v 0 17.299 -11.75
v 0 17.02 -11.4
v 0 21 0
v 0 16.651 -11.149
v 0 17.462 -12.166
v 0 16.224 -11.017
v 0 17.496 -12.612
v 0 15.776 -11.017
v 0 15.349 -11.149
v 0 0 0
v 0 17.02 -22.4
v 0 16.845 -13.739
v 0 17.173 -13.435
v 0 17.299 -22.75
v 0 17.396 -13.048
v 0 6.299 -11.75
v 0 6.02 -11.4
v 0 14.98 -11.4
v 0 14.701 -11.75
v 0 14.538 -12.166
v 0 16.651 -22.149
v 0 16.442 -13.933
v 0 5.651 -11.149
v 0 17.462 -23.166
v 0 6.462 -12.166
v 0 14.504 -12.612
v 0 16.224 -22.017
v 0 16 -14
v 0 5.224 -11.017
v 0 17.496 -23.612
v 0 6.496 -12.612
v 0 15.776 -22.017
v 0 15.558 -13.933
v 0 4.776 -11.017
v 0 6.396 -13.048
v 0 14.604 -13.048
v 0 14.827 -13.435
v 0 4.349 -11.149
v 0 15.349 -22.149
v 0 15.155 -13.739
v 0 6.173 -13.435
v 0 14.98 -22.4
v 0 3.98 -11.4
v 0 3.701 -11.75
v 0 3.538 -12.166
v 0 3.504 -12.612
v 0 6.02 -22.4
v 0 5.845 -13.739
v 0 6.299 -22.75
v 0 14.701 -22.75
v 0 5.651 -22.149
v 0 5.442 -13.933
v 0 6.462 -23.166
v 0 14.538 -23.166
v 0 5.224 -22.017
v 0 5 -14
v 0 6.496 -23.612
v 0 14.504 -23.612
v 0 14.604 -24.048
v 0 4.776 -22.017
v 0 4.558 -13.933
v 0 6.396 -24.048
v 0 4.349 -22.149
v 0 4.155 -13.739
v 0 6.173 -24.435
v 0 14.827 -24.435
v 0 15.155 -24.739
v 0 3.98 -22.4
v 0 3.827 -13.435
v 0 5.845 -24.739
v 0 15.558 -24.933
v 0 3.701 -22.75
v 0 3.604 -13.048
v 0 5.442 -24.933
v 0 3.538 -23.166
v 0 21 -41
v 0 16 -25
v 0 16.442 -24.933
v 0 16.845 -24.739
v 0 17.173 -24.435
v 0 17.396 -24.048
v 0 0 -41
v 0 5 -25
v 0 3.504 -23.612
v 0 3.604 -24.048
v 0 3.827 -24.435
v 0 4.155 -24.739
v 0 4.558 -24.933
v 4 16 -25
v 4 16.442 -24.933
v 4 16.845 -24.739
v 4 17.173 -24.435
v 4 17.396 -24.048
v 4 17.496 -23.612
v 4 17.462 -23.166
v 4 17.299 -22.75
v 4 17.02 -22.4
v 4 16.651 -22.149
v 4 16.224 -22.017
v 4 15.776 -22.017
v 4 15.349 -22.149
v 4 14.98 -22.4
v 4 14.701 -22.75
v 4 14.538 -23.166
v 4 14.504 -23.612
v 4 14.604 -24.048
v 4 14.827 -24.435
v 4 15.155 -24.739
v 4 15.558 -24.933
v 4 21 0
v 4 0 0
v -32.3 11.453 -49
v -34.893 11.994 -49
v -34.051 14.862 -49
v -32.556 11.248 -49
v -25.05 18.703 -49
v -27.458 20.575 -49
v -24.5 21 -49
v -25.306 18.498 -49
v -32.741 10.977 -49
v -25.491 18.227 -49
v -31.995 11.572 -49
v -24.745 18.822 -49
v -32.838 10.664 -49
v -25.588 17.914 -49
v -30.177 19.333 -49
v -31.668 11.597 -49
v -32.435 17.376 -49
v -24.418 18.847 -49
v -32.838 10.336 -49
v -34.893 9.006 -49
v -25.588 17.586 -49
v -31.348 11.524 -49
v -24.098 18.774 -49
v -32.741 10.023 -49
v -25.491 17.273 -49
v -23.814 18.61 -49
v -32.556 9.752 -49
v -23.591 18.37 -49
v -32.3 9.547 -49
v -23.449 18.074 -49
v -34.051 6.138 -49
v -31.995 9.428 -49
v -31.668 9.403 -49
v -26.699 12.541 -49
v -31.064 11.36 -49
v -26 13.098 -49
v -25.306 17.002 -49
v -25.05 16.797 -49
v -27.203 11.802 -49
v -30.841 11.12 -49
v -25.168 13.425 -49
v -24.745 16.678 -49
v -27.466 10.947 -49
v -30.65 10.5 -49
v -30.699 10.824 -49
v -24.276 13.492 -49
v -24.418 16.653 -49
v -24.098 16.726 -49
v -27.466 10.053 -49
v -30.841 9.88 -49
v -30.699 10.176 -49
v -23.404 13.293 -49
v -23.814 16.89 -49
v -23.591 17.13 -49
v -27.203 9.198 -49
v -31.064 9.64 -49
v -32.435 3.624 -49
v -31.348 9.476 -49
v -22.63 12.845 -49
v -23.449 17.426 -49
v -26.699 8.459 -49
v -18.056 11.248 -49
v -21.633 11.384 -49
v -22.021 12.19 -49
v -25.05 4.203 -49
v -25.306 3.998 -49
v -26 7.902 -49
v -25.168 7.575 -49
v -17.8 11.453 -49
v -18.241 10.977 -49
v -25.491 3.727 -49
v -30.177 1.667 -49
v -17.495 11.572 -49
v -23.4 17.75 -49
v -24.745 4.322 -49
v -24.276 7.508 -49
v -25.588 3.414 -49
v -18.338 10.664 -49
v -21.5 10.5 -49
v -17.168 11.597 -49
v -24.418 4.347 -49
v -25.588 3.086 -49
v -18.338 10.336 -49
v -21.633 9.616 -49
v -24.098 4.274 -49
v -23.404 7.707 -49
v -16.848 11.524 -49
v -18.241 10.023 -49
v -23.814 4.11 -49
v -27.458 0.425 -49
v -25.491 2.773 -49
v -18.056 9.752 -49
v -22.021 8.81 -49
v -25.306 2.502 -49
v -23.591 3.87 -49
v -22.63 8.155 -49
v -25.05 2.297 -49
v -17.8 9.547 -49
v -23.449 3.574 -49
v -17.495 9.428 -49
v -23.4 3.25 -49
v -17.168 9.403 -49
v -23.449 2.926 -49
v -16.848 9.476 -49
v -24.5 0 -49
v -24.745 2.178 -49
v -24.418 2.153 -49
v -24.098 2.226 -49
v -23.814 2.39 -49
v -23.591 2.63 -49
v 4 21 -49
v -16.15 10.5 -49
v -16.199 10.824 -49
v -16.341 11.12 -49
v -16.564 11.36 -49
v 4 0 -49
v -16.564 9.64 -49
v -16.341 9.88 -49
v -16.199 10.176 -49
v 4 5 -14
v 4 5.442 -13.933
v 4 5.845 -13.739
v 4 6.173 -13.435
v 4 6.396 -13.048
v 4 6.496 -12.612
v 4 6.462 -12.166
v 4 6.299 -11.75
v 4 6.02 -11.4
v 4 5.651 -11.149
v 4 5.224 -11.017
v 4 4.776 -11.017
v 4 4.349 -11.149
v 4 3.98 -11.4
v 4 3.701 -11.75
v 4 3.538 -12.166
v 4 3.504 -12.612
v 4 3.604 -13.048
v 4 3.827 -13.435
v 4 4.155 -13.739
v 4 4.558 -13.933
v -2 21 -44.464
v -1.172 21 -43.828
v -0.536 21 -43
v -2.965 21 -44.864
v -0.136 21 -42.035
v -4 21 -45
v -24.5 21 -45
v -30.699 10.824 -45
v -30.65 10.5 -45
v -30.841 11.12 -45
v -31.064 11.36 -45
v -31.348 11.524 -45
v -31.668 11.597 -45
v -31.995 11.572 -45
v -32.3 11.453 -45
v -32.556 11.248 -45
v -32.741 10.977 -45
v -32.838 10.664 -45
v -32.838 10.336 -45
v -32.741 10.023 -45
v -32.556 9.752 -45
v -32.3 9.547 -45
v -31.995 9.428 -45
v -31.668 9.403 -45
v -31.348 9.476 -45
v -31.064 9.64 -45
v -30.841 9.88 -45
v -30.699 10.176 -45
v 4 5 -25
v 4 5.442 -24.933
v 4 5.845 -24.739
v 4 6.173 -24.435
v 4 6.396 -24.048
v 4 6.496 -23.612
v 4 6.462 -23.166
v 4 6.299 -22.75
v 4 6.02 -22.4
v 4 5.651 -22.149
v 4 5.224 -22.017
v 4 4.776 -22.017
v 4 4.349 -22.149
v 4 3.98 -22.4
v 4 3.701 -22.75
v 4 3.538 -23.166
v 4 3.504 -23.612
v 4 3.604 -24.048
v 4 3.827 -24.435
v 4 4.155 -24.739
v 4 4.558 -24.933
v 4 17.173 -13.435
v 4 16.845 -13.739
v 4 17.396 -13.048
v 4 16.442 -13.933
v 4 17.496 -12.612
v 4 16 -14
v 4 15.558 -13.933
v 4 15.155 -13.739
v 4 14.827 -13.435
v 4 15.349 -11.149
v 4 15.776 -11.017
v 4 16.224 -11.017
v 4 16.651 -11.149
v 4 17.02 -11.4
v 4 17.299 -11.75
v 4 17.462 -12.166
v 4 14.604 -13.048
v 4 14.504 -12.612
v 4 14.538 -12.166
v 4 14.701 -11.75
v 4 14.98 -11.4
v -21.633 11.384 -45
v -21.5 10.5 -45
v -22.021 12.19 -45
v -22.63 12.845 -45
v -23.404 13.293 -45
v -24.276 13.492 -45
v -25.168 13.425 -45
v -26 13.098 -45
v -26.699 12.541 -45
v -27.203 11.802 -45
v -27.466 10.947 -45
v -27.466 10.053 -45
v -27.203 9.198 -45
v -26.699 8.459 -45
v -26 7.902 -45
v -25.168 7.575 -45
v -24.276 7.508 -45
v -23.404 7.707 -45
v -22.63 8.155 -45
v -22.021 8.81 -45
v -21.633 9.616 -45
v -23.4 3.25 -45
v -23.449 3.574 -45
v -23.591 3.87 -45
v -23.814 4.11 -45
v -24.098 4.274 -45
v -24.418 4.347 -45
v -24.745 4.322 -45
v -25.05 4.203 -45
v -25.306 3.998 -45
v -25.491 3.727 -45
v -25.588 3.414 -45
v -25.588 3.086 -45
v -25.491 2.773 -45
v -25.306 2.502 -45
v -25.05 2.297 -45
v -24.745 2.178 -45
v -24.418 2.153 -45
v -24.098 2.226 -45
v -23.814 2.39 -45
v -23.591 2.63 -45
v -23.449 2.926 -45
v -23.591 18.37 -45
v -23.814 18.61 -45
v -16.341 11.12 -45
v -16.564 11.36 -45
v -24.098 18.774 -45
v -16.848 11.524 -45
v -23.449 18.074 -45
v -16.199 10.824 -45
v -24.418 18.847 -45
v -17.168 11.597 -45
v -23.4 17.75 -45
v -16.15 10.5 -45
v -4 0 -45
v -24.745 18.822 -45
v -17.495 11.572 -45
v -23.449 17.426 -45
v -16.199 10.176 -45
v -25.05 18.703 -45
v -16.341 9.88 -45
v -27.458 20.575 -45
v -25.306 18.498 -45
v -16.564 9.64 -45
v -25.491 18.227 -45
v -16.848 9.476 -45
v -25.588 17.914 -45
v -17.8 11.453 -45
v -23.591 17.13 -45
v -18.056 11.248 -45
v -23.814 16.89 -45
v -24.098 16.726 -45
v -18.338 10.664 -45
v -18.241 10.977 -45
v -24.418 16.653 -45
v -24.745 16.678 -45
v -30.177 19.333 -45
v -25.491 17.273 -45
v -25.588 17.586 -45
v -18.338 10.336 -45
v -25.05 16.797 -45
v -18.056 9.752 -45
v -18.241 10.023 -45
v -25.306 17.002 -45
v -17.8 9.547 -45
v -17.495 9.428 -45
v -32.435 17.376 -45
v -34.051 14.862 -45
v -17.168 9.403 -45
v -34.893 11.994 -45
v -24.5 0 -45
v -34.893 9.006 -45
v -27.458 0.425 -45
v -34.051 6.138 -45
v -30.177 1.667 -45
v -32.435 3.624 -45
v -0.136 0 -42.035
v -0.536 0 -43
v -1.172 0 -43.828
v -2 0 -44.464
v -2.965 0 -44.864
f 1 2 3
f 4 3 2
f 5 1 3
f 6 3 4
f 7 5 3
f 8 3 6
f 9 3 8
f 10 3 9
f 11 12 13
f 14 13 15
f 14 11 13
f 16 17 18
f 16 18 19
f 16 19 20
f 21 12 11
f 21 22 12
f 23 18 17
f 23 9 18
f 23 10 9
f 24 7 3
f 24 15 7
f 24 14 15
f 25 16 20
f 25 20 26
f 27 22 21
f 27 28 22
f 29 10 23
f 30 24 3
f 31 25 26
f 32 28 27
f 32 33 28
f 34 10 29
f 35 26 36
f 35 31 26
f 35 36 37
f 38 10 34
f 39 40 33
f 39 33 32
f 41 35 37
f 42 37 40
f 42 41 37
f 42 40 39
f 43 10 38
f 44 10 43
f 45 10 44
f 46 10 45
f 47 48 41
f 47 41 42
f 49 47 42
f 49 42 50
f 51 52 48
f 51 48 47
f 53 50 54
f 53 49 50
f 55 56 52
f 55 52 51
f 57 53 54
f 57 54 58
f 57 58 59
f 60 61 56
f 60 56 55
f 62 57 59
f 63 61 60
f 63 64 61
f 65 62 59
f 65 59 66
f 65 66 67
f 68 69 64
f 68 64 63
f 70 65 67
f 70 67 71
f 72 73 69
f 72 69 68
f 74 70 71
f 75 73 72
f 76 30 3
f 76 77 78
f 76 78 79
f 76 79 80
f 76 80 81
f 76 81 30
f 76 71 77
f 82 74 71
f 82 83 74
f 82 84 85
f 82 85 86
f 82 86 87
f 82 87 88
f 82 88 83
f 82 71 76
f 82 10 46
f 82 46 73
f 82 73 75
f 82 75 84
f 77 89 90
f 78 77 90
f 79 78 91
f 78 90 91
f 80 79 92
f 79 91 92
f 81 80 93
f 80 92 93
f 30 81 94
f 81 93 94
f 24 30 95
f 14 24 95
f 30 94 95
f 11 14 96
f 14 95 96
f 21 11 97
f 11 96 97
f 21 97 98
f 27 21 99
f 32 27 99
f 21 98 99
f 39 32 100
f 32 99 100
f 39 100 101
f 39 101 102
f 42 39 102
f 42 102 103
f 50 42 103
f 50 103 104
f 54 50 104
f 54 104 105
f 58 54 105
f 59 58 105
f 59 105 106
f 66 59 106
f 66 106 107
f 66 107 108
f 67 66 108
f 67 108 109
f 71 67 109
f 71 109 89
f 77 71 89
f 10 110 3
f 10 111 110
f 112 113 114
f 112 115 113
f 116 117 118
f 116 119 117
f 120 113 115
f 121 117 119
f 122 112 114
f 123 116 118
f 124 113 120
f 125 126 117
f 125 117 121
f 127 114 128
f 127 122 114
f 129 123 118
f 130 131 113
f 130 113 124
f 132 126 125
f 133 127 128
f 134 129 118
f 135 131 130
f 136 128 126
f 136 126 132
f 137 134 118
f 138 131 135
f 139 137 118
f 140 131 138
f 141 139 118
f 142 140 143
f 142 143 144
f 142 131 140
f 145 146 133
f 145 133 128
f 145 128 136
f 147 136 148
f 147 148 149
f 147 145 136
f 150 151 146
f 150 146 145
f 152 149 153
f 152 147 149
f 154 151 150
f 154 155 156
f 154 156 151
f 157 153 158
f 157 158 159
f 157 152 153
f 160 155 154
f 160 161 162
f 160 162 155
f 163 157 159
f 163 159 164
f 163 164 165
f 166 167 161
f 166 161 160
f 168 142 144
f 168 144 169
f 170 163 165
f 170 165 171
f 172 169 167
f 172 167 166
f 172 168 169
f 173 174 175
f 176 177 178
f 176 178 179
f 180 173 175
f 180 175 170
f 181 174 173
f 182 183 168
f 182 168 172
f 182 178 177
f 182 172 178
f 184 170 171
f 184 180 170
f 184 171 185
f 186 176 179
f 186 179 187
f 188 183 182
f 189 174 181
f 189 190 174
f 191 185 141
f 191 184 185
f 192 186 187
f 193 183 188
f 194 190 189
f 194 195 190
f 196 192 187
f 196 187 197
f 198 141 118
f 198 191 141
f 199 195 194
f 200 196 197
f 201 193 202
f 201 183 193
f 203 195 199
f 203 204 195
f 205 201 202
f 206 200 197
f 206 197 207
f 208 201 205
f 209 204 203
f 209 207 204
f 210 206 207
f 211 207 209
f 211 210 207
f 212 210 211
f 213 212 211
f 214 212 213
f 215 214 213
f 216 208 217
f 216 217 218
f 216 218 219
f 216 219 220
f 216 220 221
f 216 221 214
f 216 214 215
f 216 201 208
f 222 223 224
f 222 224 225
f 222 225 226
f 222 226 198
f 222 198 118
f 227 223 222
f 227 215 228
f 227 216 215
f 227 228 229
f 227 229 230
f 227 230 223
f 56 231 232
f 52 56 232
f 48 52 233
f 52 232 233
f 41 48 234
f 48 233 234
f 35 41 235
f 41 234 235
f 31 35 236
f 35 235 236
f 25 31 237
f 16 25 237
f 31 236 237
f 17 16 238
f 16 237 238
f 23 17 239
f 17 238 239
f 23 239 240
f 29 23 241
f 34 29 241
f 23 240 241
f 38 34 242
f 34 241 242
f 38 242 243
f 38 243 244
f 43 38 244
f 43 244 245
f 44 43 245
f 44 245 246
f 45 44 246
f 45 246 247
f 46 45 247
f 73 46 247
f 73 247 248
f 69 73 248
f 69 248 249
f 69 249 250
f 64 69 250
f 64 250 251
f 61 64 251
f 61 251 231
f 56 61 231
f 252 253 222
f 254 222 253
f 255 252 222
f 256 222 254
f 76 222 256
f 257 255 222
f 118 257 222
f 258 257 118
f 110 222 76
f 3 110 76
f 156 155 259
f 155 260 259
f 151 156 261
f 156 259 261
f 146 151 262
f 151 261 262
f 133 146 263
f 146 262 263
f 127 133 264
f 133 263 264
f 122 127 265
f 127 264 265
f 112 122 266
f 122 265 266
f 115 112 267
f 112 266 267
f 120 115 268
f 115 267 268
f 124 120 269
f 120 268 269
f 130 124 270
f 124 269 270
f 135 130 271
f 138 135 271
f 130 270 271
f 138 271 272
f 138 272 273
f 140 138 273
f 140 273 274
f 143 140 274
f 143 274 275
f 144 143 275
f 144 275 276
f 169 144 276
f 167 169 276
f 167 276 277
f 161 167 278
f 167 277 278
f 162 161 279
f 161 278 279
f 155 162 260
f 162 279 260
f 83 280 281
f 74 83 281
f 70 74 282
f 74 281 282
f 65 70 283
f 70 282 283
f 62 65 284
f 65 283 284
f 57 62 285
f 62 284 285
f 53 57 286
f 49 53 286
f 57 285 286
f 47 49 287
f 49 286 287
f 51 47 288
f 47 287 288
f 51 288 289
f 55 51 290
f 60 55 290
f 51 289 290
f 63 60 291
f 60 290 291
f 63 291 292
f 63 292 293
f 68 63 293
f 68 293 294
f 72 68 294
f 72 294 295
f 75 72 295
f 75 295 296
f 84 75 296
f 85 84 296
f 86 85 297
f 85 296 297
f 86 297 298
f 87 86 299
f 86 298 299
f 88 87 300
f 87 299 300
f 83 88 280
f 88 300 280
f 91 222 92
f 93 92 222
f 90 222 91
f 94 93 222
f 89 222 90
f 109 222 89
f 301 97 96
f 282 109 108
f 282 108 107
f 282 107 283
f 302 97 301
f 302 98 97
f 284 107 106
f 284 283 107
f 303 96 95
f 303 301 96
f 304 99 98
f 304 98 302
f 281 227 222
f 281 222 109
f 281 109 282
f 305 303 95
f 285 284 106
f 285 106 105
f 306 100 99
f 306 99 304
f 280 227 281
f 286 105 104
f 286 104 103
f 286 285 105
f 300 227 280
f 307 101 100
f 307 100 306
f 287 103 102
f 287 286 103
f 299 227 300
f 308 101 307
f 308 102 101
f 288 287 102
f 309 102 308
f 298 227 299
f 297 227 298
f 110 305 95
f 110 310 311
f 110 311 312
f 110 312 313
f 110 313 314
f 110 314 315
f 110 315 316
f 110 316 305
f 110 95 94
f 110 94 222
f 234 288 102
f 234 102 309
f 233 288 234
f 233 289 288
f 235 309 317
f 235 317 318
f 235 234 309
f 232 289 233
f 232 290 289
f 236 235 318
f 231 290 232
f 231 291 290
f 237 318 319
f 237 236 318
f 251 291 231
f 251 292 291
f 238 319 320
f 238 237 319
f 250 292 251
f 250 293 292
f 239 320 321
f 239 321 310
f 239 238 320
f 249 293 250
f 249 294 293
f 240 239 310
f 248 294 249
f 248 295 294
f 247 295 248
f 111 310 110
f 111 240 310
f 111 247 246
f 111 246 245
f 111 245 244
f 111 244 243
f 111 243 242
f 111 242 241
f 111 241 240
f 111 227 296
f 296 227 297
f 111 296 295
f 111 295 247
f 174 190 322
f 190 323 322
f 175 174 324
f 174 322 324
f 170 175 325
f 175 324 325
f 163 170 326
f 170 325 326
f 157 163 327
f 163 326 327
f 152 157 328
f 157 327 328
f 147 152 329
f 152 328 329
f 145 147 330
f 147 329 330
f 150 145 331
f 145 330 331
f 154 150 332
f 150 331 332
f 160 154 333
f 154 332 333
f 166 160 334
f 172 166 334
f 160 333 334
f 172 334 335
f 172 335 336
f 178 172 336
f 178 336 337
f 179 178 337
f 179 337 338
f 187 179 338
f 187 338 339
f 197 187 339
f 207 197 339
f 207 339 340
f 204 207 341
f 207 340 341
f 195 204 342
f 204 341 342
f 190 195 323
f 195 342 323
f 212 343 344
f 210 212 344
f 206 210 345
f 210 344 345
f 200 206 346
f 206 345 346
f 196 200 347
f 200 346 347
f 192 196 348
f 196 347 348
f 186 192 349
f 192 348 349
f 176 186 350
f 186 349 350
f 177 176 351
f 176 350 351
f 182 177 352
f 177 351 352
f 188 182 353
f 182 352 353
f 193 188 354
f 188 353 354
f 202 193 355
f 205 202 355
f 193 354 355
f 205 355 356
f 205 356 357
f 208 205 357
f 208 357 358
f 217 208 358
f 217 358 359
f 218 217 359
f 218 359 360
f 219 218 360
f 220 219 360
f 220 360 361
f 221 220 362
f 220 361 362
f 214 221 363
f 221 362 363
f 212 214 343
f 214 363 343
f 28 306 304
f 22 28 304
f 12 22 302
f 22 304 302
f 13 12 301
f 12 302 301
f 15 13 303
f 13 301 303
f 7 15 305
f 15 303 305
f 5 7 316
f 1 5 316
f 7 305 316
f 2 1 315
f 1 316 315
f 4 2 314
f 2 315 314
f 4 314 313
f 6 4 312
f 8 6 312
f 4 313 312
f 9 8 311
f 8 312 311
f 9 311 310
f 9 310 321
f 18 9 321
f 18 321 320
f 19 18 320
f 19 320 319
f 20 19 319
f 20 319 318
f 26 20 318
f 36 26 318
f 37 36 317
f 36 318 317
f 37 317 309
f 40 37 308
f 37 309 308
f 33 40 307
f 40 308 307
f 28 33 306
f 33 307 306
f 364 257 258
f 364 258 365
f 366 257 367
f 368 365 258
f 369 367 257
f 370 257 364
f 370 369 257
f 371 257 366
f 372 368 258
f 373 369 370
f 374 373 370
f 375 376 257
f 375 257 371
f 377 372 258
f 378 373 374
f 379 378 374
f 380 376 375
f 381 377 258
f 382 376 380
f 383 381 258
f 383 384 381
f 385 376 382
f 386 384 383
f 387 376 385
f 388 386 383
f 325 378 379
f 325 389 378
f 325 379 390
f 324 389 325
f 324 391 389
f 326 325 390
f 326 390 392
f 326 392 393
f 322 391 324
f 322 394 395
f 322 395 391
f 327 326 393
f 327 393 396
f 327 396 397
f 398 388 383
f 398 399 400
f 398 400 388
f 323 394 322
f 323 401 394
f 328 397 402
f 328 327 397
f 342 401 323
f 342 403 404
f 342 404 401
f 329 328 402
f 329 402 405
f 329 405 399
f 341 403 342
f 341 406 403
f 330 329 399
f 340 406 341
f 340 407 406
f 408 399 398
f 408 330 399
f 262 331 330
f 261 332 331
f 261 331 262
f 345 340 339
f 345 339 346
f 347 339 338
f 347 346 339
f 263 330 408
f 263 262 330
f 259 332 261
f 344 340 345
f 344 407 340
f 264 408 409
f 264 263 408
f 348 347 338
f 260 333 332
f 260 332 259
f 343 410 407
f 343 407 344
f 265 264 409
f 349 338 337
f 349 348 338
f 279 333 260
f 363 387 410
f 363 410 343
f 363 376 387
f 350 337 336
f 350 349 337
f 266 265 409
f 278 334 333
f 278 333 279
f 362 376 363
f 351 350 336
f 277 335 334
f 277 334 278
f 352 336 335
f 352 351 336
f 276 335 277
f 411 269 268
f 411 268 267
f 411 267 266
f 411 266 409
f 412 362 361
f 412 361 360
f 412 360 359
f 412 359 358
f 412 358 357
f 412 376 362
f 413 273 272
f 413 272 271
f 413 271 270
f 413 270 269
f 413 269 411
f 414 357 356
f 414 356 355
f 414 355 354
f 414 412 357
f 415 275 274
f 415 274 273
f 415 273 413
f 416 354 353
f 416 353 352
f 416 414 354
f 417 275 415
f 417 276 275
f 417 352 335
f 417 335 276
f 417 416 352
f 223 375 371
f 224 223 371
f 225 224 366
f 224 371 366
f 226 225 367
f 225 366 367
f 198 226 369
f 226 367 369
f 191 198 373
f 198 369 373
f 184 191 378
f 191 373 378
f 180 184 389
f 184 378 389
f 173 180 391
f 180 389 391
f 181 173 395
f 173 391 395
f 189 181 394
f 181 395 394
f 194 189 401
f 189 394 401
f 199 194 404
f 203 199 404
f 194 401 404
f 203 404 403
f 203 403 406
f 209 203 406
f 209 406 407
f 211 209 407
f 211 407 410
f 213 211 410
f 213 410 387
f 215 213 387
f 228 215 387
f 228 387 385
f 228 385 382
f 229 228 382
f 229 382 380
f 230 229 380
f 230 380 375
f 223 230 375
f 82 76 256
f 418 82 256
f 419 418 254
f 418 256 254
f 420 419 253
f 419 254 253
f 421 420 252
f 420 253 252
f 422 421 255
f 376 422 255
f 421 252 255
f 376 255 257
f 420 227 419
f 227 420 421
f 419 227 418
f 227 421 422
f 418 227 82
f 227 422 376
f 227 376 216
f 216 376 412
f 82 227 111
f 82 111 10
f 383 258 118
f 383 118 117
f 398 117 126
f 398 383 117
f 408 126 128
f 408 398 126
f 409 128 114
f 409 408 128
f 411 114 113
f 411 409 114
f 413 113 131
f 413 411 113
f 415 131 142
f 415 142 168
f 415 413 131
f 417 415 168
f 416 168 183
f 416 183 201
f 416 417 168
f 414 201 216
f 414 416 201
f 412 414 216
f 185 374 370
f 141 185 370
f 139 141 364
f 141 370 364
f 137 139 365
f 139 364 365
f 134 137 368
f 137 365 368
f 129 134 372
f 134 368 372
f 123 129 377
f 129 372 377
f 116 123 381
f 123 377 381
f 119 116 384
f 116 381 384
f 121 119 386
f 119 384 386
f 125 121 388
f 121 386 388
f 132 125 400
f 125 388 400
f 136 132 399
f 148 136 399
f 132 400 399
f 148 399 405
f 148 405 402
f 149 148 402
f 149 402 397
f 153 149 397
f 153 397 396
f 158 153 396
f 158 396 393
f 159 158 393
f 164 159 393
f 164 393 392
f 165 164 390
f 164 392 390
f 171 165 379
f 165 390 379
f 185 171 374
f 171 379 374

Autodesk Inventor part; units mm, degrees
ref_plane "YZ Plane" through (0, 0, 0) normal (1, 0, 0) x (0, 1, 0)
ref_plane "XZ Plane" through (0, 0, 0) normal (0, 1, 0) x (-1, 0, 0)
ref_plane "XY Plane" through (0, 0, 0) normal (0, 0, 1) x (1, 0, 0)
sketch "Sketch1" plane through (0, 0, 0) normal (0, 1, 0) x (-1, 0, 0)
  line L0 (0, 0) -> (0, -45)
  line L1 (0, -45) -> (35, -45)
  line L2 (35, -45) -> (35, -49)
  line L3 (35, -49) -> (-4, -49)
  line L4 (-4, -49) -> (-4, 0)
  line L5 (-4, 0) -> (0, 0)
  dimension "d0" = 45
  dimension "d1" = 35
  dimension "d2" = 4
  dimension "d3" = 39
extrude "Extrusion1" add sketch "Sketch1" along normal blind 21
sketch "Sketch2" plane through (4, 0, 0) normal (1, 0, 0) x (0, 0, -1)
  line L0 (0, 21) -> (49, 21) projected
  line L1 (0, 21) -> (12.5, 21)
  line L2 (12.5, 21) -> (12.5, 16)
  line L3 (12.5, 16) -> (0, 16)
  line L4 (0, 16) -> (0, 21)
  line L5 (12.5, 16) -> (23.5, 16)
  line L6 (23.5, 16) -> (23.5, 5)
  line L7 (23.5, 5) -> (12.5, 5)
  line L8 (12.5, 5) -> (12.5, 16)
  circle A0 centre (12.5, 16) radius 1.5
  circle A1 centre (23.5, 16) radius 1.5
  circle A2 centre (12.5, 5) radius 1.5
  circle A3 centre (23.5, 5) radius 1.5
  point P0 (0, 0)
  dimension "d6" = 12.5
  dimension "d7" = 5
  dimension "d8" = 11
  dimension "d9" = 11
  dimension "d10" = 3
  dimension "d11" = 3
  dimension "d12" = 3
  dimension "d13" = 3
extrude "Extrusion2" cut sketch "Sketch2" against normal blind 21 contours A0 L5 L2 | L2 L3 A0 | L3 L8 A0 | L5 A0 L8 | A1 L6 L5 | L5 L6 A1 | A2 L7 L8 | L8 L7 A2 | A3 L7 L6 | L6 L7 A3
sketch "Sketch3" plane through (-35, 0, -45) normal (0, 0, 1) x (1, 0, 0)
  line L0 (0, 0) -> (0, 21) projected
  line L1 (0, 10.5) -> (10.5, 10.5)
  circle A0 centre (10.5, 10.5) radius 10.5
  line L2 (0, 21) -> (10.5, 21)
  line L3 (10.5, 21) -> (10.5, 0)
  line L4 (10.5, 0) -> (0, 0)
  line L5 (0, 0) -> (0, 21)
  circle A1 centre (10.5, 10.5) radius 8
  circle A2 centre (10.5, 10.5) radius 6.5
  line L6 (10.5, 18.5) -> (10.5, 17)
  line L7 (10.5, 4) -> (10.5, 2.5)
  line L8 (2.5, 10.5) -> (4, 10.5)
  line L9 (10.5, 10.5) -> (18.5, 10.5)
  line L10 (18.5, 10.5) -> (17, 10.5)
  circle A3 centre (10.5, 17.75) radius 1.1
  circle A4 centre (3.25, 10.5) radius 1.1
  circle A5 centre (17.75, 10.5) radius 1.1
  circle A6 centre (10.5, 3.25) radius 1.1
  circle A7 centre (10.5, 10.5) radius 3
  point P0 (35, 0)
  point P1 (10.5, 21)
  dimension "d16" = 10.5
  dimension "d17" = 16
  dimension "d18" = 13
  dimension "d19" = 2.2
  dimension "d20" = 2.2
  dimension "d21" = 2.2
  dimension "d22" = 2.2
  dimension "d23" = 6
extrude "Extrusion3" cut sketch "Sketch3" against normal blind 21 contours L0 A0 L4 | L0 L2 A0 | A4 A1 L1 | L1 A1 A4 | A6 A1 L3 | L3 A1 A6 | A1 A4 A2 L1 | L1 A2 A4 A1 | A3 A1 L3 | L3 A1 A3 | A1 A6 A2 L3 | L3 A2 A6 A1 | A2 A4 L1 | L1 A4 A2 | A1 L3 A2 A3 | A1 A3 A2 L3 | A2 A6 L3 | L3 A6 A2 | A5 A2 L9 A1 | A1 A5 | A2 L3 A3 | A2 A3 L3 | A1 L9 A2 A5 | A5 L9 A2 | A7 L3 L1 | L1 L3 A7 | A2 L9 A5 | L3 L9 A7 | L3 A7 L9
fillet "Fillet1" radius 4 1 edges at (0, 10.5, -45)
properties part number "L2"
